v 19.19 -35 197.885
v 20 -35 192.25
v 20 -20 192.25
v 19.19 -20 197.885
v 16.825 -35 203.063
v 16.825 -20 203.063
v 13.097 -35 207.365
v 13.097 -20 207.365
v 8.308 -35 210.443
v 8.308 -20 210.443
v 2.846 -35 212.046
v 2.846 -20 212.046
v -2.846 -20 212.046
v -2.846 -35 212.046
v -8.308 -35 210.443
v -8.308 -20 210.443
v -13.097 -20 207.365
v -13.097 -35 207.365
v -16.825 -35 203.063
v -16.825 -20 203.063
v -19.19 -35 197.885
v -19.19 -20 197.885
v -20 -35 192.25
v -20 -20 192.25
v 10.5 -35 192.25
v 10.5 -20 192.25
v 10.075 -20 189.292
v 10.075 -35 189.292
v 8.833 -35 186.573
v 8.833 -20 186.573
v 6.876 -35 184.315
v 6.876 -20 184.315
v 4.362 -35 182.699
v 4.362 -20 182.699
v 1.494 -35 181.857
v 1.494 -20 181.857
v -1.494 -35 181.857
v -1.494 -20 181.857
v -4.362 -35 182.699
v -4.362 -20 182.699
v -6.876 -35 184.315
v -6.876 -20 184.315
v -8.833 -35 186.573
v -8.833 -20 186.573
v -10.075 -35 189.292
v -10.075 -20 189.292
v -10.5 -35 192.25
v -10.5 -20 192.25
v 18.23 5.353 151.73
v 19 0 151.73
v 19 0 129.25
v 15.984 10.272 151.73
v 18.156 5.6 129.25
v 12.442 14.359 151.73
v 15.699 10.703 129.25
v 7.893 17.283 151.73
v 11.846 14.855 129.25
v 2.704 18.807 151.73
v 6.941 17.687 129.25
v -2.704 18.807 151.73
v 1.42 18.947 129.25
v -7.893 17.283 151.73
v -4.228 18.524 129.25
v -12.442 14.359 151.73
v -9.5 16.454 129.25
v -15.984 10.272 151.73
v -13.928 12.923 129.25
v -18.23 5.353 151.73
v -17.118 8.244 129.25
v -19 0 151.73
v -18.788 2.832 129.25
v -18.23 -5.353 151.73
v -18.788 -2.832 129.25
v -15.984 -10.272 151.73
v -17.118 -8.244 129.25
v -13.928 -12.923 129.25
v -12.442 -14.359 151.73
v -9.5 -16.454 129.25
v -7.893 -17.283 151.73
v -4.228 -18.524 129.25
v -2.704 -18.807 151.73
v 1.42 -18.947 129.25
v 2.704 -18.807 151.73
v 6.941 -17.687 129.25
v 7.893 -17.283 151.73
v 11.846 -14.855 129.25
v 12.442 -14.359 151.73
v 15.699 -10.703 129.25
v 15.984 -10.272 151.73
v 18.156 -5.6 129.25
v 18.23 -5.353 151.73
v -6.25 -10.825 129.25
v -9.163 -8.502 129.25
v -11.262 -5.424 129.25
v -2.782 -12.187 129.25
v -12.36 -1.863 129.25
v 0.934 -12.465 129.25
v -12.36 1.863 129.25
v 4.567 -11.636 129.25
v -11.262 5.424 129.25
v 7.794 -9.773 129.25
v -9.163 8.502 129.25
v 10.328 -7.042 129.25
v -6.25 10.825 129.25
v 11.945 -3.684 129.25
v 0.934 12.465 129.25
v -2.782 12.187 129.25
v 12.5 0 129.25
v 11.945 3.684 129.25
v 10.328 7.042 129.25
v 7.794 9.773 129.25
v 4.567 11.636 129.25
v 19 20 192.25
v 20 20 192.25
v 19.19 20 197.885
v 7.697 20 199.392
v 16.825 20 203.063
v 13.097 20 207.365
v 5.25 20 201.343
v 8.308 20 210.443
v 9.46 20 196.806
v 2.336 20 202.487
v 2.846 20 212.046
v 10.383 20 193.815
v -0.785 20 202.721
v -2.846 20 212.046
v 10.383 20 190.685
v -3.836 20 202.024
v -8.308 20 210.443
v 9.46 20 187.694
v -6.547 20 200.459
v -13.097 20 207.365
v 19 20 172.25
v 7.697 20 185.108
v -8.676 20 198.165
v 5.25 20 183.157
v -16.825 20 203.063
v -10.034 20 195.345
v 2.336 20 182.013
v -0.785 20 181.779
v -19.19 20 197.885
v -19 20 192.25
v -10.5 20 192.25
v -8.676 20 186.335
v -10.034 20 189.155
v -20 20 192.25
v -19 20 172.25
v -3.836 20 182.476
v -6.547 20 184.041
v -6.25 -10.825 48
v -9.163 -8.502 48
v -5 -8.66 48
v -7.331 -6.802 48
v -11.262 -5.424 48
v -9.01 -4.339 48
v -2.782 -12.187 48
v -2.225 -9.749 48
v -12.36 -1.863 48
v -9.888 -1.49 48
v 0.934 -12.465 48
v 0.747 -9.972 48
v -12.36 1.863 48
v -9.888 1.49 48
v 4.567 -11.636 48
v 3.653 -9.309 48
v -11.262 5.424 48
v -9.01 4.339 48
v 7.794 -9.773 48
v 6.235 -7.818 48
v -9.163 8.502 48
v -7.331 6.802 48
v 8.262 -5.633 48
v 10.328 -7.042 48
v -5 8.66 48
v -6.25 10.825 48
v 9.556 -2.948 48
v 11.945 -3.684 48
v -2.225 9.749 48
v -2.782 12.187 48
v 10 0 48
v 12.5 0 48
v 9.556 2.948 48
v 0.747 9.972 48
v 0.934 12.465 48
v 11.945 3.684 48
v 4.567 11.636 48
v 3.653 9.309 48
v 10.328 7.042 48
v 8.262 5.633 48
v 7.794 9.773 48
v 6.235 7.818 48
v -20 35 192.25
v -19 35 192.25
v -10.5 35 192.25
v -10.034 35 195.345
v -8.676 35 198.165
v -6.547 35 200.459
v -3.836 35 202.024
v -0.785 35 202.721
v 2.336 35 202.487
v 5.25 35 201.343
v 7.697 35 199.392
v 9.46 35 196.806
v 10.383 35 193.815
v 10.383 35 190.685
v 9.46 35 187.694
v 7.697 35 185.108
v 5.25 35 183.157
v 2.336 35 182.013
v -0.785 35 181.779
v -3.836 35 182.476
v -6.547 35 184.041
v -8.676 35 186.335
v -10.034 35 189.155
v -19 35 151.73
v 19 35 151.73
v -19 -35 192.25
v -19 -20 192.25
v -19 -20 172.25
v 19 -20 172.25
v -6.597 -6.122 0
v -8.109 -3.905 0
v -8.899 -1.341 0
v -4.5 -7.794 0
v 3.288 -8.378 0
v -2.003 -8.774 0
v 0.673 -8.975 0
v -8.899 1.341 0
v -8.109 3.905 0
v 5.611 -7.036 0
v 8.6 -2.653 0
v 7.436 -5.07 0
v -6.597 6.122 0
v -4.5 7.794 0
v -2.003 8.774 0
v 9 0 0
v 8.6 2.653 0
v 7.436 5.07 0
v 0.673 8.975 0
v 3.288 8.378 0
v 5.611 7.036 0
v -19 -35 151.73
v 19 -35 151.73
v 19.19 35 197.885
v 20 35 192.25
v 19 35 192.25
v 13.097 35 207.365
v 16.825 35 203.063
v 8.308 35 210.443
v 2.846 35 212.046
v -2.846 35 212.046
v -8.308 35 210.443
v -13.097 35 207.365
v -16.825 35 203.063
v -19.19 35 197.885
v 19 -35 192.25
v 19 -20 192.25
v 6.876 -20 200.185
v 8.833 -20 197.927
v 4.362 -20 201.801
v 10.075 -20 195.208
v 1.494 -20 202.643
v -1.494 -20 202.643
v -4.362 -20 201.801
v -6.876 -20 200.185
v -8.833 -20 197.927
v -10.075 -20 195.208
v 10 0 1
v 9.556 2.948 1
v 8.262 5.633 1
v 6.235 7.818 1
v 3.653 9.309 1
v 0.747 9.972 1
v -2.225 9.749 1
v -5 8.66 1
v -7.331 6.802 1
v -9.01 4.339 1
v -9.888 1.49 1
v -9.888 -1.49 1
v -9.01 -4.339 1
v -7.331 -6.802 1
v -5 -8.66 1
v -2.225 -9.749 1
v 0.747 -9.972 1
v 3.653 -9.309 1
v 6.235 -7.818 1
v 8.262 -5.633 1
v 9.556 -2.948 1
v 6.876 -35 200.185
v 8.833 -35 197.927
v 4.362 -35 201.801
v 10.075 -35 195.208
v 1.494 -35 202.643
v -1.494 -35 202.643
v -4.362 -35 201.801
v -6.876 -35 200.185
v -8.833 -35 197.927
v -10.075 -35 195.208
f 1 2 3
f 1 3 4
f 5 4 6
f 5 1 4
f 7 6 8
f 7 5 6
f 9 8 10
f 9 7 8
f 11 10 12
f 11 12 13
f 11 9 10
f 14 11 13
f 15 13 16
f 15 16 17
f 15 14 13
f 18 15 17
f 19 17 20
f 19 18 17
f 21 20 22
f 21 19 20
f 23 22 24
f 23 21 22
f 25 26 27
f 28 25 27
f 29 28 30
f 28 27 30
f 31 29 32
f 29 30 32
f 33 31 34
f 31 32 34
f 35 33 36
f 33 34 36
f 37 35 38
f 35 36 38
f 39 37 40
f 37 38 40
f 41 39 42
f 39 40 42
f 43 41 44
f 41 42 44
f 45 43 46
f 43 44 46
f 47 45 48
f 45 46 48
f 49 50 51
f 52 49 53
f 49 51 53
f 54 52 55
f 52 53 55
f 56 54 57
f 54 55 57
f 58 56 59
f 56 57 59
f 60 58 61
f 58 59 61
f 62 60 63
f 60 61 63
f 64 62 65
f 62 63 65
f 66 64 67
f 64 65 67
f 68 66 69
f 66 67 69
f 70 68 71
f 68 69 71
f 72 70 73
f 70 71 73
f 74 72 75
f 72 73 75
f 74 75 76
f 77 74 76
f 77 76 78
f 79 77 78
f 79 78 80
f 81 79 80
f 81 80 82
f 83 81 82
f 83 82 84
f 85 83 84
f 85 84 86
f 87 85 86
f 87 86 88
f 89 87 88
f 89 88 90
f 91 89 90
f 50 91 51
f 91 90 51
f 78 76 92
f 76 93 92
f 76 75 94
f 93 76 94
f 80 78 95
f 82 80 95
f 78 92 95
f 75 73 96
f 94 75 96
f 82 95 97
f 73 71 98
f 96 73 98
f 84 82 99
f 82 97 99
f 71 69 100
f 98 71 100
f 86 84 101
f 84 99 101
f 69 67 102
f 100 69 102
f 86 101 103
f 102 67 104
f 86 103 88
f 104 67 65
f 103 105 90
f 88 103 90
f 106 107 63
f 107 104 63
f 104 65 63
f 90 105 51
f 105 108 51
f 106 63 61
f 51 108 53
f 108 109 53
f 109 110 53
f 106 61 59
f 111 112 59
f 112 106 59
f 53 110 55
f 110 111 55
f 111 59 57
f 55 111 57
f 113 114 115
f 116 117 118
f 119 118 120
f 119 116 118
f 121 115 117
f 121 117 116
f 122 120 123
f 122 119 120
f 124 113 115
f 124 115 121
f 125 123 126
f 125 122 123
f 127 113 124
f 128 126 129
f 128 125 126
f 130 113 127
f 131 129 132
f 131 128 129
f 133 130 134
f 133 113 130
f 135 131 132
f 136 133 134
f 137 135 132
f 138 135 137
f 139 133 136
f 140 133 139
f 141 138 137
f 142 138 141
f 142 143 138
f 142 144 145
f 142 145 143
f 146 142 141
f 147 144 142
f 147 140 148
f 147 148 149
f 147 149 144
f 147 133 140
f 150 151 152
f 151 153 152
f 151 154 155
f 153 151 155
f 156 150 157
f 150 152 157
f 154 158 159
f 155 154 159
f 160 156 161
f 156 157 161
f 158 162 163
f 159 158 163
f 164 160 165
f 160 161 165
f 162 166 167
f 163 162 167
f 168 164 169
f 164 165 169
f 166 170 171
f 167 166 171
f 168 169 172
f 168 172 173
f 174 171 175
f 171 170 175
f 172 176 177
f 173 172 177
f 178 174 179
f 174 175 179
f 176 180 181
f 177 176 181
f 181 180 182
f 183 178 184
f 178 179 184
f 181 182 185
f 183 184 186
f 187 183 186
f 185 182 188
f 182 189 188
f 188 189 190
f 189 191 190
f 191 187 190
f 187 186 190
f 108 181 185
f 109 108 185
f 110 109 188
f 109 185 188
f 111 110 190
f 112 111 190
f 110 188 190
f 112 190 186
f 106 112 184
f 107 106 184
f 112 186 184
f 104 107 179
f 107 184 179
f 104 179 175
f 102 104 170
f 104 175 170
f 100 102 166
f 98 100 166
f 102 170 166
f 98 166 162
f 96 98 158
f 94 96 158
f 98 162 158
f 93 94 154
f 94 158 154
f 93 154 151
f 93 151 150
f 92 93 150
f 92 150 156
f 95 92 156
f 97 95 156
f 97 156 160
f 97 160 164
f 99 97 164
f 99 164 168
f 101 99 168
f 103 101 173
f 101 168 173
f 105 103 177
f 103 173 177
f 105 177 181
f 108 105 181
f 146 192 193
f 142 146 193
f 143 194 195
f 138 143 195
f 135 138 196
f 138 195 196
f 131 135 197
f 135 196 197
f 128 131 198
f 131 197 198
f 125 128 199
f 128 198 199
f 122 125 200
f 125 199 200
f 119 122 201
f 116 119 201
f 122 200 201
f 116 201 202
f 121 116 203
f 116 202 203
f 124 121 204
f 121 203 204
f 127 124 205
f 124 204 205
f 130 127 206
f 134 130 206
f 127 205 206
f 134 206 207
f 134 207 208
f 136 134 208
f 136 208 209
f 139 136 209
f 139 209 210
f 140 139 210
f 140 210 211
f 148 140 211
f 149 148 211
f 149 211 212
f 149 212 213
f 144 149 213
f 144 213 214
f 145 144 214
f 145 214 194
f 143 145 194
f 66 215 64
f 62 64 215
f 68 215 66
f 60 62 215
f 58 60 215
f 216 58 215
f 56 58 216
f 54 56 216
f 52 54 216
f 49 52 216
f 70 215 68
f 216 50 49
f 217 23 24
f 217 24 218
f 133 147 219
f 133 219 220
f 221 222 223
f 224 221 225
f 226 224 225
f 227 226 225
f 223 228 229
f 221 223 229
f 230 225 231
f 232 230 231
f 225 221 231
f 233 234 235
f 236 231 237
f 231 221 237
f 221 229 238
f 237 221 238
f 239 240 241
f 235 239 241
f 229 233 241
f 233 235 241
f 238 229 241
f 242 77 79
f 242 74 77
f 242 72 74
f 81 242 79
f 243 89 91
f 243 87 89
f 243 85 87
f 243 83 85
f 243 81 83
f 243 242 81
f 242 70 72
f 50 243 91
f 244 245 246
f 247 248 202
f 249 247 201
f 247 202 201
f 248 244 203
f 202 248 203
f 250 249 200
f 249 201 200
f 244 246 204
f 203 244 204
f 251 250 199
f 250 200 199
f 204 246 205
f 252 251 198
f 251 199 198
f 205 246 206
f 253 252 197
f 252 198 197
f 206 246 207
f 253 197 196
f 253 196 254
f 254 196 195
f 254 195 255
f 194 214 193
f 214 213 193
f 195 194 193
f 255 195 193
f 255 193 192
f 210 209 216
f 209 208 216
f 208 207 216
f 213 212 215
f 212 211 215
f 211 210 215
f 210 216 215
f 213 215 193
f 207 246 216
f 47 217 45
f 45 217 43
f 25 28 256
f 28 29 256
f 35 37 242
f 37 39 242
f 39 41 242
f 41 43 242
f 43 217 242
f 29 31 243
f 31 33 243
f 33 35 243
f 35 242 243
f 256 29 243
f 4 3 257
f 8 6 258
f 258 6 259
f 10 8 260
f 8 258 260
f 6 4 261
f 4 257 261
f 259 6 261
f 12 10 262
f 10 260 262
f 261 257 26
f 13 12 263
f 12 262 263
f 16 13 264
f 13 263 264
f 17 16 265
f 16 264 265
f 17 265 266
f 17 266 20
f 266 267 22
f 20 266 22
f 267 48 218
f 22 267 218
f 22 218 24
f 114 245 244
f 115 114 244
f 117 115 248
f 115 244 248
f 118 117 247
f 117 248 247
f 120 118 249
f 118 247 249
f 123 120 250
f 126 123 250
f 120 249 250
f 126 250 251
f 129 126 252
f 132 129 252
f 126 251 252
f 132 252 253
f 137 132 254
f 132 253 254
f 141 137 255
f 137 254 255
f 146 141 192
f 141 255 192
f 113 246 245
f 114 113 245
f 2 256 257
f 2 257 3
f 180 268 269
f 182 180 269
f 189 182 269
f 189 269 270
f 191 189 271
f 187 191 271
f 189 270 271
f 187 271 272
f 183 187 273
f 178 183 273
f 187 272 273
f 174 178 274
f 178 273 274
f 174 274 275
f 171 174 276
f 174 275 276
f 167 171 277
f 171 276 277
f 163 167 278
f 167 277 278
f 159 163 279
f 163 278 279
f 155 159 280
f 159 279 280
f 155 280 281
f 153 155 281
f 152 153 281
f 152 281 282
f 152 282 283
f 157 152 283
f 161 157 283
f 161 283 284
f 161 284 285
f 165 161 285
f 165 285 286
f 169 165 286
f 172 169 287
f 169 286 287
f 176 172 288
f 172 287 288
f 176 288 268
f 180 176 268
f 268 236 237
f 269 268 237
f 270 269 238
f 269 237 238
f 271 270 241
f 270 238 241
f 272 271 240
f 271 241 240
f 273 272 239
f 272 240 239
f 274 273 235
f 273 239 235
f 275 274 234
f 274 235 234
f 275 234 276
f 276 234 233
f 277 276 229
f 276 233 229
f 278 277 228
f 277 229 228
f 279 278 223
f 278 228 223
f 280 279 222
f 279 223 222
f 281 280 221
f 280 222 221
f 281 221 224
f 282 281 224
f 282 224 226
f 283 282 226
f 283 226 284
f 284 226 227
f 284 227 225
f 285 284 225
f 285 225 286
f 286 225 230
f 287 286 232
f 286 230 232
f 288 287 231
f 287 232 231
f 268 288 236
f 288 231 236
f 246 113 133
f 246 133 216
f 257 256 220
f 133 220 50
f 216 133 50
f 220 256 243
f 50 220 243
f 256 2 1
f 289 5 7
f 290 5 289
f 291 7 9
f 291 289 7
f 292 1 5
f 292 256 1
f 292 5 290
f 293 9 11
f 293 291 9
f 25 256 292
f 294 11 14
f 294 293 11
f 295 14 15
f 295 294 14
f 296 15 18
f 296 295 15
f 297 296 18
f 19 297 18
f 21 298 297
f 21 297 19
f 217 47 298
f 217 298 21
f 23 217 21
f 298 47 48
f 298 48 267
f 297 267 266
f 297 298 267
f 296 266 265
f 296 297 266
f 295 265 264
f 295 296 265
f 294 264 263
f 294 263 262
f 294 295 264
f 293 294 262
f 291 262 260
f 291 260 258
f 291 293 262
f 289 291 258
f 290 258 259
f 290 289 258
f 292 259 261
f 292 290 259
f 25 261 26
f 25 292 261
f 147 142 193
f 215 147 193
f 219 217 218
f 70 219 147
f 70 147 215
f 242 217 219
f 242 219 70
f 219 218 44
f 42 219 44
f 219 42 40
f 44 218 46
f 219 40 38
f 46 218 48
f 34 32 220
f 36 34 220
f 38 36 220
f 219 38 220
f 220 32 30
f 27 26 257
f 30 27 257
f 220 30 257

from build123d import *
from build123d.topology import SkipClean

# Parameters (mm, degrees)
ESQUISSE2_R             = 10
BOSS_EXTRU_1_DEPTH      = 48
ESQUISSE3_R             = 12.5
BOSS_EXTRU_2_DEPTH      = 81.25
CHANFREIN1_SIZE         = 1
ESQUISSE6_R             = 19
BOSS_EXTRU_3_DEPTH      = 60
BOSS_EXTRU_4_DEPTH      = 35
BOSS_EXTRU_4_DEPTH_BACK = 35
ESQUISSE7_W             = 38
ESQUISSE7_H             = 40.519603535
ENL_V_MAT_EXTRU_3_REACH = 207.478
BOSS_EXTRU_6_DEPTH      = 15
ESQUISSE16_W            = 38
ESQUISSE16_H            = 40
ENL_V_MAT_EXTRU_4_DEPTH = 20


with BuildPart() as part:
    # Esquisse2 → Boss.-Extru.1 (new body)
    with BuildSketch(Plane.XY):
        Circle(ESQUISSE2_R)
    extrude(amount=BOSS_EXTRU_1_DEPTH)

    # Esquisse3 → Boss.-Extru.2 (add)
    with BuildSketch(Plane.XY.offset(48)):
        Circle(ESQUISSE3_R)
    extrude(amount=BOSS_EXTRU_2_DEPTH)

    # Chanfrein1
    chanfrein1_edges = [part.edges().sort_by_distance(p)[0] for p in [
        (-10, 0, 0),
    ]]
    chamfer(chanfrein1_edges, length=CHANFREIN1_SIZE)

    # Esquisse6 → Boss.-Extru.3 (add)
    with BuildSketch(Plane.XY.offset(129.25)):
        Circle(ESQUISSE6_R)
    extrude(amount=BOSS_EXTRU_3_DEPTH)

    # Esquisse7 → Boss.-Extru.4 (add, two sides: drawn at the far end of the back side and taken through both)
    with BuildSketch(Plane(origin=(0, 0, 0), x_dir=(1, 0, 0), z_dir=(0, 1, 0)).offset(-BOSS_EXTRU_4_DEPTH_BACK)):
        with Locations((0, -171.990198233)):
            Rectangle(ESQUISSE7_W, ESQUISSE7_H)
    extrude(amount=BOSS_EXTRU_4_DEPTH + BOSS_EXTRU_4_DEPTH_BACK)

    # Esquisse12 → Enlèv. mat.-Extru.3 (cut, up to next)
    with BuildSketch(Plane(origin=(0, 35, 0), x_dir=(1, 0, 0), z_dir=(0, 1, 0)), mode=Mode.PRIVATE) as enl_v_mat_extru_3_sk1:
        with BuildLine():
            Line((-10.5, -192.25), (10.5, -192.25))
            ThreePointArc((10.5, -192.25), (0, -181.75), (-10.5, -192.25))
        make_face()
    enl_v_mat_extru_3_tool1 = extrude(enl_v_mat_extru_3_sk1.sketch, amount=-ENL_V_MAT_EXTRU_3_REACH, mode=Mode.PRIVATE) & part.part
    add(enl_v_mat_extru_3_tool1.solids().sort_by_distance((0, 35, 187.793662))[0], mode=Mode.SUBTRACT)

    # Esquisse15 → Boss.-Extru.6 (add)
    with BuildSketch(Plane(origin=(0, 35, 0), x_dir=(1, 0, 0), z_dir=(0, 1, 0))):
        with BuildLine():
            Line((-20, -192.25), (-10.5, -192.25))
            ThreePointArc((-10.5, -192.25), (0, -202.75), (10.5, -192.25))
            Line((10.5, -192.25), (20, -192.25))
            ThreePointArc((20, -192.25), (0, -212.25), (-20, -192.25))
        make_face()
    boss_extru_6 = extrude(amount=-BOSS_EXTRU_6_DEPTH)

    # Esquisse16 → Enlèv. mat.-Extru.4 (cut)
    with BuildSketch(Plane.XY.offset(192.25)):
        Rectangle(ESQUISSE16_W, ESQUISSE16_H)
    extrude(amount=-ENL_V_MAT_EXTRU_4_DEPTH, mode=Mode.SUBTRACT)

    # Symétrie2: Boss.-Extru.6 across plane
    with SkipClean():  # the faces are left unmerged after this step: merging them gives an invalid solid
        add(boss_extru_6.mirror(Plane.ZX))


solid = part.part
